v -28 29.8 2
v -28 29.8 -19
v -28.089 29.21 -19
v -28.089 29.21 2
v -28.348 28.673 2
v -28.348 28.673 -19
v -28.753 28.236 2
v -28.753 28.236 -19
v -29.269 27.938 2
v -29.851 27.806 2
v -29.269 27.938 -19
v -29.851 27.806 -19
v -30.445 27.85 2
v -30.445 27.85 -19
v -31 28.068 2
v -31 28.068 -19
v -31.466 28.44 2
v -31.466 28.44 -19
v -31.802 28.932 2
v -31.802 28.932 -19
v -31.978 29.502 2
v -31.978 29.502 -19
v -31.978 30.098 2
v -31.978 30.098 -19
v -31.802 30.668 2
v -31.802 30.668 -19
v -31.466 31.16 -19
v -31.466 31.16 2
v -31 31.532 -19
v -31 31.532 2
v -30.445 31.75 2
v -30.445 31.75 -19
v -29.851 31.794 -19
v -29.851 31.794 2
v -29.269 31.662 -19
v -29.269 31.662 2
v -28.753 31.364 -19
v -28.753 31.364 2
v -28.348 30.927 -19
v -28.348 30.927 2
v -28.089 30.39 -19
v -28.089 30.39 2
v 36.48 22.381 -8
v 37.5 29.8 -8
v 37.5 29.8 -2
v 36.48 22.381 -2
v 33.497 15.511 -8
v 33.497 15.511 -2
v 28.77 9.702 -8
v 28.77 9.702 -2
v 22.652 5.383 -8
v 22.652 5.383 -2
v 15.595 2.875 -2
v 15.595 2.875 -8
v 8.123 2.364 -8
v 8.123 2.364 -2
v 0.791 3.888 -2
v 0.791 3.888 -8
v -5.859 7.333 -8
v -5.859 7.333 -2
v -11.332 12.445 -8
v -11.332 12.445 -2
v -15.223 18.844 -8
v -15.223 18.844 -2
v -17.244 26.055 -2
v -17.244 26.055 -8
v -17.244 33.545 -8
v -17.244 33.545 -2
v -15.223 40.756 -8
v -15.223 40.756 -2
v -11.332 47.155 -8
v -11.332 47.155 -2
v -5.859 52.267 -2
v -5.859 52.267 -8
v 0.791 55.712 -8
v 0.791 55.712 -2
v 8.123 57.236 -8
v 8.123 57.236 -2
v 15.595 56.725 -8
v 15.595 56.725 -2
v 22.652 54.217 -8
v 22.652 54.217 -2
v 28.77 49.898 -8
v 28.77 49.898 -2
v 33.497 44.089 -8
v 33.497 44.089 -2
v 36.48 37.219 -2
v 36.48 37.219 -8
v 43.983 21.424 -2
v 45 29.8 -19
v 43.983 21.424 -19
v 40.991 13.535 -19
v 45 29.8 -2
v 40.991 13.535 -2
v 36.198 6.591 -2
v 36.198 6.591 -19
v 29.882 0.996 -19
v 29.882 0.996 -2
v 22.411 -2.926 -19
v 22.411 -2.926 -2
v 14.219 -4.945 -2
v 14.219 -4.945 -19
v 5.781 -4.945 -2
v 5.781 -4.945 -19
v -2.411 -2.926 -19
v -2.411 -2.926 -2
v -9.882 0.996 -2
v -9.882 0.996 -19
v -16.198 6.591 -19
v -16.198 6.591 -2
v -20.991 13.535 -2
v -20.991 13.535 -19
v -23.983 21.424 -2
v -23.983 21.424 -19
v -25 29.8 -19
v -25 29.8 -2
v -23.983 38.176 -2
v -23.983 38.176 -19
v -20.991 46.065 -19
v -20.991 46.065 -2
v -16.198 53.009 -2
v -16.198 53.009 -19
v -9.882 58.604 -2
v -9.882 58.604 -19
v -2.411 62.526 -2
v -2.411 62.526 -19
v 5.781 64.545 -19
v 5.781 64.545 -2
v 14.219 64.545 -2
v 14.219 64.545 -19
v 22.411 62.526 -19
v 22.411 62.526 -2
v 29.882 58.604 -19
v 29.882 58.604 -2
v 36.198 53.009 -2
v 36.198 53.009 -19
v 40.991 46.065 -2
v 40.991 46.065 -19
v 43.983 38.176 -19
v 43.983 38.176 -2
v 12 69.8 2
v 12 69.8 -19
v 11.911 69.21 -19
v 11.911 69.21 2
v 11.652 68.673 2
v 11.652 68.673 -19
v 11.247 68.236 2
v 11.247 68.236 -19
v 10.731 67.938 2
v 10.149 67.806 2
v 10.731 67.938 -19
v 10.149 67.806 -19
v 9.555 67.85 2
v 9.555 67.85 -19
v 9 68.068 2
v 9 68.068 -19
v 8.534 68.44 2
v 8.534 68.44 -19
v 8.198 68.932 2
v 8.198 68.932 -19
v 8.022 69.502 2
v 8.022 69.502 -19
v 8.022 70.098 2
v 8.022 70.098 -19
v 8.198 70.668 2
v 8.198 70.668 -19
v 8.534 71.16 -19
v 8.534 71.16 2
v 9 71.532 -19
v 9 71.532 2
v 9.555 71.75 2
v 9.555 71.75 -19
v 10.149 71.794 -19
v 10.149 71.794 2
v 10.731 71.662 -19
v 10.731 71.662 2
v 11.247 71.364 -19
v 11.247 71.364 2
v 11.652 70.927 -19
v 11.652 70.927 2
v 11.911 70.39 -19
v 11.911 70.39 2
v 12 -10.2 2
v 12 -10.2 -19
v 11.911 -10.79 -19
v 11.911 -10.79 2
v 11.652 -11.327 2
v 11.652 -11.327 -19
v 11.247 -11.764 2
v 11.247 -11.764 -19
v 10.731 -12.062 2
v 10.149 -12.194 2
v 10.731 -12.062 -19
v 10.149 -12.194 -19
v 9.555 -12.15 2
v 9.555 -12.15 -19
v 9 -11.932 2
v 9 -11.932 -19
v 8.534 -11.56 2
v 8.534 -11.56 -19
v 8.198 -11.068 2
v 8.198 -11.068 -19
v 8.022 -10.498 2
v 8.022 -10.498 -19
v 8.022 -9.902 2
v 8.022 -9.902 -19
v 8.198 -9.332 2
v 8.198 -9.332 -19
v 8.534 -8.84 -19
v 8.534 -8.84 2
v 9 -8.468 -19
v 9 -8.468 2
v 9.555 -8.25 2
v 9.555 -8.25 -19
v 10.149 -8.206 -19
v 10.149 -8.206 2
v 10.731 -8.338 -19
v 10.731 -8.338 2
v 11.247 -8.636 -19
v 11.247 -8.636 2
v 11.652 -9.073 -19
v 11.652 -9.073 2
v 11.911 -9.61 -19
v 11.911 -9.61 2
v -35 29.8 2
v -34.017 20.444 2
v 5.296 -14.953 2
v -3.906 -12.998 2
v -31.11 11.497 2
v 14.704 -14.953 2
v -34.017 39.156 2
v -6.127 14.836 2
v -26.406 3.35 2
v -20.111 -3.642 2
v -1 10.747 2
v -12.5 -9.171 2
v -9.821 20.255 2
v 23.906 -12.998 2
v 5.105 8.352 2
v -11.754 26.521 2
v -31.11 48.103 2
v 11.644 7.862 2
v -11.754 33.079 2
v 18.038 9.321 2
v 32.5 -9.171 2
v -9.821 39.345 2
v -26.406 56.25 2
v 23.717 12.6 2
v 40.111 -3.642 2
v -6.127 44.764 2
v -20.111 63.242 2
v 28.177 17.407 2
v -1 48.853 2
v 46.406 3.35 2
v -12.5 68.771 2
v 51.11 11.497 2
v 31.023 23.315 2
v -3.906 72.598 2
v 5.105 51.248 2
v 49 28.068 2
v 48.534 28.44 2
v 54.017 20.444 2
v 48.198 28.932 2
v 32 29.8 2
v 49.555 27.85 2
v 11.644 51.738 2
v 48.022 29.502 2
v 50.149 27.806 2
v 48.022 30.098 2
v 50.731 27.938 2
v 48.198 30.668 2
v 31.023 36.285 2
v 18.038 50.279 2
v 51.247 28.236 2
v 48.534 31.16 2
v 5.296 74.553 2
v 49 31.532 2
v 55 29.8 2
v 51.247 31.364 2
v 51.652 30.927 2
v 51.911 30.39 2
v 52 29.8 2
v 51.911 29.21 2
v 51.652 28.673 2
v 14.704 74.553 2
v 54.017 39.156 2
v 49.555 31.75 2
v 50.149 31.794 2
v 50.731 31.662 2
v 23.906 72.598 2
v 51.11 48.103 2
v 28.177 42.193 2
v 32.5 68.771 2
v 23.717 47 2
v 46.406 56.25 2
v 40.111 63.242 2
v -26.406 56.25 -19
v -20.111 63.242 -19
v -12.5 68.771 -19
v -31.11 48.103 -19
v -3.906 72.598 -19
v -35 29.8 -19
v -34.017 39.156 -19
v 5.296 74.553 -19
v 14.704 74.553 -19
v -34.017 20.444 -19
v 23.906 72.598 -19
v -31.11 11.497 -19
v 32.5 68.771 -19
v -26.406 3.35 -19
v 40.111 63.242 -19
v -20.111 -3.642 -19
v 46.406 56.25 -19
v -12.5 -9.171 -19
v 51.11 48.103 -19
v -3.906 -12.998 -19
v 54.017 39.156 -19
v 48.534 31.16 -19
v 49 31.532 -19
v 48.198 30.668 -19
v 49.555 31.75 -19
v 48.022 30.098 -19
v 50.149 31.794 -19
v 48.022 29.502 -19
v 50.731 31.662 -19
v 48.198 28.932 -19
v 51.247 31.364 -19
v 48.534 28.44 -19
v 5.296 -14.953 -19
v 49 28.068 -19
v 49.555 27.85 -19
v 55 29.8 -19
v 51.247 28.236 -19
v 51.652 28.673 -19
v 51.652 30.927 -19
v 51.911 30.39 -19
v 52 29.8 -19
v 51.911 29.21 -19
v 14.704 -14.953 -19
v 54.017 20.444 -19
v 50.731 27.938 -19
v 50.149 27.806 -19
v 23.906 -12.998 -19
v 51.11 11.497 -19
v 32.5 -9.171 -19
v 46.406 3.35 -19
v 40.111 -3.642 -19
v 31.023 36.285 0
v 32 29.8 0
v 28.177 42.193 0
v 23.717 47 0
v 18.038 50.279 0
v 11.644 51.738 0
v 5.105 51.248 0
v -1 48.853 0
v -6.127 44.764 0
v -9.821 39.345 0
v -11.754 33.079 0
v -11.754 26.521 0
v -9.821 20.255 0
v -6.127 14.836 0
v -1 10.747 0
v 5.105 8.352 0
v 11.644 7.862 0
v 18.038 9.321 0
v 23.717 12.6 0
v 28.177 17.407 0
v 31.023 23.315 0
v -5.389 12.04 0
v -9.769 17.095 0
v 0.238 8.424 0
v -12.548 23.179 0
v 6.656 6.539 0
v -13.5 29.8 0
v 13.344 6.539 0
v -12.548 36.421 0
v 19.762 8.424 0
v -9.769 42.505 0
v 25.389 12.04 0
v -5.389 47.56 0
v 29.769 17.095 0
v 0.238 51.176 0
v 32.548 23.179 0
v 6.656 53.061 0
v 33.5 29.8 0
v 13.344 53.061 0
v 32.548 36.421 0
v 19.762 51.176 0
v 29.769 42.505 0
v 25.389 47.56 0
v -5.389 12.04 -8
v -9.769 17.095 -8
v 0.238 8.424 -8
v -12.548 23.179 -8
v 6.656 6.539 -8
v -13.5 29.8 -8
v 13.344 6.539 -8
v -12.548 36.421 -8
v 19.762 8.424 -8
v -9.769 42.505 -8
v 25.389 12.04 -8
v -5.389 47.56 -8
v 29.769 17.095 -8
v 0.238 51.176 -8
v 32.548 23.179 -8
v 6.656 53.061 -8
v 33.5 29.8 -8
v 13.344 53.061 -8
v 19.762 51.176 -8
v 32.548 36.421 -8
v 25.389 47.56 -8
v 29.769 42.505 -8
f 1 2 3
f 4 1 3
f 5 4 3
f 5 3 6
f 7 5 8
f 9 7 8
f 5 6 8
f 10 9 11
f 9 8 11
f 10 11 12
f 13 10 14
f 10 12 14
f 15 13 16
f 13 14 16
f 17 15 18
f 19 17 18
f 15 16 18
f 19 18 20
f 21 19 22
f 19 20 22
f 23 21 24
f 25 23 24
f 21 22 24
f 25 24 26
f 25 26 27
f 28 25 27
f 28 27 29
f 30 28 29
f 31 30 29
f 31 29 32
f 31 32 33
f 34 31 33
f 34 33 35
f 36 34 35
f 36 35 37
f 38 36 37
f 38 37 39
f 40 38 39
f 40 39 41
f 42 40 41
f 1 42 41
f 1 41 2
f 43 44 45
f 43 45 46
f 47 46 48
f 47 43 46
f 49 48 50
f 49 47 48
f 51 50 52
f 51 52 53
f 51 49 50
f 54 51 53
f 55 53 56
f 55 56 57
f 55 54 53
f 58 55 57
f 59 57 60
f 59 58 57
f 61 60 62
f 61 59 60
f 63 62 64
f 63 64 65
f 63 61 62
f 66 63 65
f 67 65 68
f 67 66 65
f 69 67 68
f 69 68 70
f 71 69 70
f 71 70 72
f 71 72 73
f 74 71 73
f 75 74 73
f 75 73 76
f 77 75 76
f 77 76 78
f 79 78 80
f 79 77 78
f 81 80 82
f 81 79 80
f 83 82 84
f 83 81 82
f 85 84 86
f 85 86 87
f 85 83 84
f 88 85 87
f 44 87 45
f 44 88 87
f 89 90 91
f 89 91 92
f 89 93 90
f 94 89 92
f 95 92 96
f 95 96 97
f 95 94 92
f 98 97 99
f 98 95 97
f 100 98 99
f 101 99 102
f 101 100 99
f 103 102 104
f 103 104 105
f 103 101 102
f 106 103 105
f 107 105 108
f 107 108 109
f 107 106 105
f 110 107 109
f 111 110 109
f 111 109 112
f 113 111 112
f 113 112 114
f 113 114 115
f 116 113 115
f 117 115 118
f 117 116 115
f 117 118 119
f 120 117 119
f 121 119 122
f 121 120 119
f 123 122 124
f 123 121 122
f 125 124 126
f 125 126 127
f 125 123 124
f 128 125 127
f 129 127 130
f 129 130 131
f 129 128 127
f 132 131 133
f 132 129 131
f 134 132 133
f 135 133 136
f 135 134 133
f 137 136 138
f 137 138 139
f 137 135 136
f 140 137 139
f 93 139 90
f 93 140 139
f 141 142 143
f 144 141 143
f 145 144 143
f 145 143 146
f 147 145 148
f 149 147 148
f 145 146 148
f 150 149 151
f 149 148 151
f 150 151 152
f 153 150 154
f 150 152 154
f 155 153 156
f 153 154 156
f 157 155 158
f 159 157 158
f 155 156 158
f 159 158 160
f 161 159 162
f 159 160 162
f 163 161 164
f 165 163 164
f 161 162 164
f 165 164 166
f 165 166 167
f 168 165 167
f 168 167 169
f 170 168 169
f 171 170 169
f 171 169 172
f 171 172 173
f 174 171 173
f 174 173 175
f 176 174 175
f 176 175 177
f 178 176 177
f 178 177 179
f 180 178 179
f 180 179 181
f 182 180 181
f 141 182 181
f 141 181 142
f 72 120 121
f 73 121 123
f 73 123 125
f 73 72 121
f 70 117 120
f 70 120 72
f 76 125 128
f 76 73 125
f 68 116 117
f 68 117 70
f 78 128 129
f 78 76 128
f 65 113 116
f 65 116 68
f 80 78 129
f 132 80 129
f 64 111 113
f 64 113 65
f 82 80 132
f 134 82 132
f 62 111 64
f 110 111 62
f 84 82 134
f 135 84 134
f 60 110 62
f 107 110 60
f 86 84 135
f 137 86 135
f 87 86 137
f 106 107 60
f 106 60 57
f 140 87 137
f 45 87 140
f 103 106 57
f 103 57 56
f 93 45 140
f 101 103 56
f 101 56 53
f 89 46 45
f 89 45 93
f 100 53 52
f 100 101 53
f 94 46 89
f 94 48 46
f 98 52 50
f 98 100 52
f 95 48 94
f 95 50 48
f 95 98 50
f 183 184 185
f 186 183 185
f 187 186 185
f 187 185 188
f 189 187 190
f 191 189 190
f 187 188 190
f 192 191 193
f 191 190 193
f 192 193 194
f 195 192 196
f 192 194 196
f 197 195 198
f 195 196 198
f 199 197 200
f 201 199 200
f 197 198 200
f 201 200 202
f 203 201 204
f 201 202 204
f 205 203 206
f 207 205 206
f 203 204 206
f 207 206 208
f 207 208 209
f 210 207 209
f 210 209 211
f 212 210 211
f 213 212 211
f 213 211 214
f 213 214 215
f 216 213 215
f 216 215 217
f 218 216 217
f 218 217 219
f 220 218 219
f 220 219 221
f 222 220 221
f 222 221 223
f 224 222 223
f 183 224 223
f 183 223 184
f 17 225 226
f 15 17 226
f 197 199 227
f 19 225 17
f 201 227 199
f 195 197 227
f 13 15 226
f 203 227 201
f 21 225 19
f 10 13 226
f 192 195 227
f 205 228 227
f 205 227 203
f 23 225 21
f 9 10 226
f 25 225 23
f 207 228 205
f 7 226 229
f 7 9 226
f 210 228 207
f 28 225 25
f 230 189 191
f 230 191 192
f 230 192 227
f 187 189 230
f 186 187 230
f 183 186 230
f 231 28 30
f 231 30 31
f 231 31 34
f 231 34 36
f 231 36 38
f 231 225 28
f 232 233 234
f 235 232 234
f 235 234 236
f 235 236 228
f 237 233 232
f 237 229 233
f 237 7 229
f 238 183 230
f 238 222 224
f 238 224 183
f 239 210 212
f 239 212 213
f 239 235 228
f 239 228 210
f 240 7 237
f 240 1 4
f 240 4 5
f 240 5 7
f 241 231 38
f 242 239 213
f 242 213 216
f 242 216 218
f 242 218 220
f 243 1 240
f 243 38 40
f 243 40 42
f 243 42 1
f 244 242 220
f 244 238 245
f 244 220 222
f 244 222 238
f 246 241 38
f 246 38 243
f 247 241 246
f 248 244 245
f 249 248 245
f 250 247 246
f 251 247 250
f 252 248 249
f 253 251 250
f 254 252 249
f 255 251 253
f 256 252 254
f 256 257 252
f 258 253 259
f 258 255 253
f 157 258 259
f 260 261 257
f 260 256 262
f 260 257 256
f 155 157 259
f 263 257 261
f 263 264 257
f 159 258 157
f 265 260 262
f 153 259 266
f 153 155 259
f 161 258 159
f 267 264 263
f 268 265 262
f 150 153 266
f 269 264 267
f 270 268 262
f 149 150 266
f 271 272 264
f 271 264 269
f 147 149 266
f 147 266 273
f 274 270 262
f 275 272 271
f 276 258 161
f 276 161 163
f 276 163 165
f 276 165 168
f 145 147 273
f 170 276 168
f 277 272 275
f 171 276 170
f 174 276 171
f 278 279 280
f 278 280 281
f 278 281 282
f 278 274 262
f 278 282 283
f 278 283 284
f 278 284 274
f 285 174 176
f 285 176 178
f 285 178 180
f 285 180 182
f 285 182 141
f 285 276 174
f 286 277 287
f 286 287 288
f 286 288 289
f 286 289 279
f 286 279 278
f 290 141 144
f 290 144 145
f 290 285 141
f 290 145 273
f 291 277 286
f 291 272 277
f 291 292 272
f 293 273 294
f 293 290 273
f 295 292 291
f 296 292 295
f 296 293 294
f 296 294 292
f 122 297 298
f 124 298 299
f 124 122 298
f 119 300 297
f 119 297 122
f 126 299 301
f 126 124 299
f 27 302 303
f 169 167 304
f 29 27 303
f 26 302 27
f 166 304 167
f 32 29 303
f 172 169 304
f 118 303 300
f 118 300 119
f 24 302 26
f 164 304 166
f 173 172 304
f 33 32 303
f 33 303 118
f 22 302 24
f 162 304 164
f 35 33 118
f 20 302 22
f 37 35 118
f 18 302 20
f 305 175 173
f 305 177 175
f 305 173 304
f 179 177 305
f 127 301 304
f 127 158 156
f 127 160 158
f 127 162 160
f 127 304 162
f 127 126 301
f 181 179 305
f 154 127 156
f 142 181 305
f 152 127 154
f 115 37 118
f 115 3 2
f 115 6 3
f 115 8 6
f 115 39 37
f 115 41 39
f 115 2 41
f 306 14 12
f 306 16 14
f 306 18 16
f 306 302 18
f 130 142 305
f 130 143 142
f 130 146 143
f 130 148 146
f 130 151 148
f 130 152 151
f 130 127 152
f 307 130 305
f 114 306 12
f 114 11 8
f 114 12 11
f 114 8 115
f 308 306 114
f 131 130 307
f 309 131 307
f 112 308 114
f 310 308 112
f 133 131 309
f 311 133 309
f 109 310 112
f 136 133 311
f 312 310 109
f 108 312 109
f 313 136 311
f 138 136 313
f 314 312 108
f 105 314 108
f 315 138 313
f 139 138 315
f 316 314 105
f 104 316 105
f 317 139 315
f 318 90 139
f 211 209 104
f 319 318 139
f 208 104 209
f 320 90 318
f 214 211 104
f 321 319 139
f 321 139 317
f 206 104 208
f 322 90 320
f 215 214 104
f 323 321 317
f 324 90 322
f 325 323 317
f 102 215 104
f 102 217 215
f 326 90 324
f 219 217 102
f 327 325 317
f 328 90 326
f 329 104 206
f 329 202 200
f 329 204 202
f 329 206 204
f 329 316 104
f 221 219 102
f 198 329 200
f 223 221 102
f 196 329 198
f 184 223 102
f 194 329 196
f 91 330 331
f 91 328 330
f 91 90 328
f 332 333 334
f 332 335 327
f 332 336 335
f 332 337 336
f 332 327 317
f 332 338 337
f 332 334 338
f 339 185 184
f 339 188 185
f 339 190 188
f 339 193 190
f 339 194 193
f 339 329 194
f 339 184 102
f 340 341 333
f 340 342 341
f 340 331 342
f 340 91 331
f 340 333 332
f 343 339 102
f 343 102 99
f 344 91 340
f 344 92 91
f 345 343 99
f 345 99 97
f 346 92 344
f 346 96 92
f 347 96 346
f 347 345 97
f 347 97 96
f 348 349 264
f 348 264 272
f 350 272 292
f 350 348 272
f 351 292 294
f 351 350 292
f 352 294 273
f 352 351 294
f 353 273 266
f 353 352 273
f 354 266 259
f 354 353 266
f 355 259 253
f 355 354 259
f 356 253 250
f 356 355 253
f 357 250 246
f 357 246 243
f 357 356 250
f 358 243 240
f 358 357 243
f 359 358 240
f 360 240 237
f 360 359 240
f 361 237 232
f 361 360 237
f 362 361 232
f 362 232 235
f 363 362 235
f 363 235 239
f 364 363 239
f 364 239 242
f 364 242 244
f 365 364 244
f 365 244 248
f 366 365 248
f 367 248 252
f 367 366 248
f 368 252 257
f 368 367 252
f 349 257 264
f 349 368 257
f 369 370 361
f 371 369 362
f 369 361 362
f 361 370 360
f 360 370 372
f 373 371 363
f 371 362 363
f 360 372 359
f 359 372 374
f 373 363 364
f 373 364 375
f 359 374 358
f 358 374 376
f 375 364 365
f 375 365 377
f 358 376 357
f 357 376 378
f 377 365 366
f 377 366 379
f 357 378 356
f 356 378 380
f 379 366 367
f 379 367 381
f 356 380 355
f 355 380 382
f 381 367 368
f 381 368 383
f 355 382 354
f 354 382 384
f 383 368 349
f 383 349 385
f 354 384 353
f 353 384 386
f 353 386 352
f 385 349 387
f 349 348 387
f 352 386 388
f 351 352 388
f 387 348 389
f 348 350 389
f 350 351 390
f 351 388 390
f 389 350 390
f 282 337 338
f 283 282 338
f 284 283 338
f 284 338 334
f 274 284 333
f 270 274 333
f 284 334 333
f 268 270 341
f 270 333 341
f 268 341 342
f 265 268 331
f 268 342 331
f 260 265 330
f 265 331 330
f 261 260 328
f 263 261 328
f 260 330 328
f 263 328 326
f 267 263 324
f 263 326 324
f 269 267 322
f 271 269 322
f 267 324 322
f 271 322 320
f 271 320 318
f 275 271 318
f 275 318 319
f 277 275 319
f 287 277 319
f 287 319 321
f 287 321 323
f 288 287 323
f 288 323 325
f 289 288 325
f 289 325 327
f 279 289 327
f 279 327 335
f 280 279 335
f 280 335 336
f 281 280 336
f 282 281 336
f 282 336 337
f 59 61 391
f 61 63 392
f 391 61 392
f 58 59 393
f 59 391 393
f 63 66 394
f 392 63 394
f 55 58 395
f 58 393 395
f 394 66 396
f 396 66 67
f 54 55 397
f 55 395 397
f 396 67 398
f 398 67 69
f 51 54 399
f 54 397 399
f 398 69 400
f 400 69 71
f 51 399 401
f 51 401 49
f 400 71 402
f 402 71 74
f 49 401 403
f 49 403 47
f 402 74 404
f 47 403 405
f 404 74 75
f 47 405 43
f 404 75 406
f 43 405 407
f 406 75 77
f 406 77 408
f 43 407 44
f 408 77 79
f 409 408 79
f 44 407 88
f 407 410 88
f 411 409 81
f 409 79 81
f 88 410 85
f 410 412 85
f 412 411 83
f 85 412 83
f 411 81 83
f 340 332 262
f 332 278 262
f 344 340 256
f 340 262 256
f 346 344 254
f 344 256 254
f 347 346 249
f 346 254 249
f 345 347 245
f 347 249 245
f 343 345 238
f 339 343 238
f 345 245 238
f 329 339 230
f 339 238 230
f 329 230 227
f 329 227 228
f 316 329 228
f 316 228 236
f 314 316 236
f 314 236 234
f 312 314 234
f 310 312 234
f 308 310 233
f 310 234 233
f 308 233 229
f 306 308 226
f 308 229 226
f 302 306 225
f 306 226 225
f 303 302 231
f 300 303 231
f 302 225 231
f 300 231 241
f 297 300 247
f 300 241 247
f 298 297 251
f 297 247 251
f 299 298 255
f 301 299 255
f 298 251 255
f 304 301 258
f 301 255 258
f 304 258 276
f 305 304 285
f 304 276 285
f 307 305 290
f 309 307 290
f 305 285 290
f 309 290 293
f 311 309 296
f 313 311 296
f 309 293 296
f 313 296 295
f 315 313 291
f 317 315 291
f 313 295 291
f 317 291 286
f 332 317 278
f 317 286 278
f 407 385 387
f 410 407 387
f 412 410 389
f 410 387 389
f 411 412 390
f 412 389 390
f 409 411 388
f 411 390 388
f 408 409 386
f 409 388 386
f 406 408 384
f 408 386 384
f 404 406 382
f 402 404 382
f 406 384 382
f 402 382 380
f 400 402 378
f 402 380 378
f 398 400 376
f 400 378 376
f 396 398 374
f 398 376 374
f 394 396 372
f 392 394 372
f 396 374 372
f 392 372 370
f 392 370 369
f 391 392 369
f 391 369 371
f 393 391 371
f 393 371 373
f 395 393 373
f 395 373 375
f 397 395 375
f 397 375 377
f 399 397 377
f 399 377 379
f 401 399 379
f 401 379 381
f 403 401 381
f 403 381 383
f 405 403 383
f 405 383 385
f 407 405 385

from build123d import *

# Parameters (mm, degrees)
F0_R        = 23.5
F0_R_2      = 22
F1_DEPTH    = 2
F2_R        = 45
F2_R_2      = 23.5
F3_DEPTH    = 10
F4_R        = 35
F4_R_2      = 27.5
F5_DEPTH    = 6
F5_FACE_R   = 45
F5_FACE_R_2 = 35
F6_DEPTH    = 11
F7_R        = 2
F8_DEPTH    = 21.001


with BuildPart() as f1:
    # F0 (on Top) → F1 (new body)
    with BuildSketch(Plane.XY):
        with Locations((10, 29.8)):
            Circle(F0_R)
        with Locations((10, 29.8)):
            Circle(F0_R_2, mode=Mode.SUBTRACT)
    extrude(amount=F1_DEPTH)

    # F2 (on face) → F3 (join)
    with BuildSketch(Plane.XY.offset(2)):
        with Locations((10, 29.8)):
            Circle(F2_R)
        with Locations((10, 29.8)):
            Circle(F2_R_2, mode=Mode.SUBTRACT)
    extrude(amount=-F3_DEPTH)

    # F4 (on face) → F5 (cut)
    with BuildSketch(Plane(origin=(0, 0, -8), x_dir=(1, 0, 0), z_dir=(0, 0, -1))):
        with Locations((10, -29.8)):
            Circle(F4_R)
        with Locations((10, -29.8)):
            Circle(F4_R_2, mode=Mode.SUBTRACT)
    extrude(amount=-F5_DEPTH, mode=Mode.SUBTRACT)

    # F5_face (on face) → F6 (join)
    with BuildSketch(Plane(origin=(10, 29.8, -8), x_dir=(1, 0, 0), z_dir=(0, 0, -1))):
        Circle(F5_FACE_R)
        Circle(F5_FACE_R_2, mode=Mode.SUBTRACT)
    extrude(amount=F6_DEPTH)

    # F7 (on face) → F8 (cut, through all)
    with BuildSketch(Plane(origin=(0, 0, -19), x_dir=(1, 0, 0), z_dir=(0, 0, -1))):
        with Locations((10, 10.2)):
            Circle(F7_R)
        with Locations((-30, -29.8)):
            Circle(F7_R)
        with Locations((10, -69.8)):
            Circle(F7_R)
        with Locations((50, -29.8)):
            Circle(F7_R)
    extrude(amount=-F8_DEPTH, mode=Mode.SUBTRACT)


solid = f1.part
